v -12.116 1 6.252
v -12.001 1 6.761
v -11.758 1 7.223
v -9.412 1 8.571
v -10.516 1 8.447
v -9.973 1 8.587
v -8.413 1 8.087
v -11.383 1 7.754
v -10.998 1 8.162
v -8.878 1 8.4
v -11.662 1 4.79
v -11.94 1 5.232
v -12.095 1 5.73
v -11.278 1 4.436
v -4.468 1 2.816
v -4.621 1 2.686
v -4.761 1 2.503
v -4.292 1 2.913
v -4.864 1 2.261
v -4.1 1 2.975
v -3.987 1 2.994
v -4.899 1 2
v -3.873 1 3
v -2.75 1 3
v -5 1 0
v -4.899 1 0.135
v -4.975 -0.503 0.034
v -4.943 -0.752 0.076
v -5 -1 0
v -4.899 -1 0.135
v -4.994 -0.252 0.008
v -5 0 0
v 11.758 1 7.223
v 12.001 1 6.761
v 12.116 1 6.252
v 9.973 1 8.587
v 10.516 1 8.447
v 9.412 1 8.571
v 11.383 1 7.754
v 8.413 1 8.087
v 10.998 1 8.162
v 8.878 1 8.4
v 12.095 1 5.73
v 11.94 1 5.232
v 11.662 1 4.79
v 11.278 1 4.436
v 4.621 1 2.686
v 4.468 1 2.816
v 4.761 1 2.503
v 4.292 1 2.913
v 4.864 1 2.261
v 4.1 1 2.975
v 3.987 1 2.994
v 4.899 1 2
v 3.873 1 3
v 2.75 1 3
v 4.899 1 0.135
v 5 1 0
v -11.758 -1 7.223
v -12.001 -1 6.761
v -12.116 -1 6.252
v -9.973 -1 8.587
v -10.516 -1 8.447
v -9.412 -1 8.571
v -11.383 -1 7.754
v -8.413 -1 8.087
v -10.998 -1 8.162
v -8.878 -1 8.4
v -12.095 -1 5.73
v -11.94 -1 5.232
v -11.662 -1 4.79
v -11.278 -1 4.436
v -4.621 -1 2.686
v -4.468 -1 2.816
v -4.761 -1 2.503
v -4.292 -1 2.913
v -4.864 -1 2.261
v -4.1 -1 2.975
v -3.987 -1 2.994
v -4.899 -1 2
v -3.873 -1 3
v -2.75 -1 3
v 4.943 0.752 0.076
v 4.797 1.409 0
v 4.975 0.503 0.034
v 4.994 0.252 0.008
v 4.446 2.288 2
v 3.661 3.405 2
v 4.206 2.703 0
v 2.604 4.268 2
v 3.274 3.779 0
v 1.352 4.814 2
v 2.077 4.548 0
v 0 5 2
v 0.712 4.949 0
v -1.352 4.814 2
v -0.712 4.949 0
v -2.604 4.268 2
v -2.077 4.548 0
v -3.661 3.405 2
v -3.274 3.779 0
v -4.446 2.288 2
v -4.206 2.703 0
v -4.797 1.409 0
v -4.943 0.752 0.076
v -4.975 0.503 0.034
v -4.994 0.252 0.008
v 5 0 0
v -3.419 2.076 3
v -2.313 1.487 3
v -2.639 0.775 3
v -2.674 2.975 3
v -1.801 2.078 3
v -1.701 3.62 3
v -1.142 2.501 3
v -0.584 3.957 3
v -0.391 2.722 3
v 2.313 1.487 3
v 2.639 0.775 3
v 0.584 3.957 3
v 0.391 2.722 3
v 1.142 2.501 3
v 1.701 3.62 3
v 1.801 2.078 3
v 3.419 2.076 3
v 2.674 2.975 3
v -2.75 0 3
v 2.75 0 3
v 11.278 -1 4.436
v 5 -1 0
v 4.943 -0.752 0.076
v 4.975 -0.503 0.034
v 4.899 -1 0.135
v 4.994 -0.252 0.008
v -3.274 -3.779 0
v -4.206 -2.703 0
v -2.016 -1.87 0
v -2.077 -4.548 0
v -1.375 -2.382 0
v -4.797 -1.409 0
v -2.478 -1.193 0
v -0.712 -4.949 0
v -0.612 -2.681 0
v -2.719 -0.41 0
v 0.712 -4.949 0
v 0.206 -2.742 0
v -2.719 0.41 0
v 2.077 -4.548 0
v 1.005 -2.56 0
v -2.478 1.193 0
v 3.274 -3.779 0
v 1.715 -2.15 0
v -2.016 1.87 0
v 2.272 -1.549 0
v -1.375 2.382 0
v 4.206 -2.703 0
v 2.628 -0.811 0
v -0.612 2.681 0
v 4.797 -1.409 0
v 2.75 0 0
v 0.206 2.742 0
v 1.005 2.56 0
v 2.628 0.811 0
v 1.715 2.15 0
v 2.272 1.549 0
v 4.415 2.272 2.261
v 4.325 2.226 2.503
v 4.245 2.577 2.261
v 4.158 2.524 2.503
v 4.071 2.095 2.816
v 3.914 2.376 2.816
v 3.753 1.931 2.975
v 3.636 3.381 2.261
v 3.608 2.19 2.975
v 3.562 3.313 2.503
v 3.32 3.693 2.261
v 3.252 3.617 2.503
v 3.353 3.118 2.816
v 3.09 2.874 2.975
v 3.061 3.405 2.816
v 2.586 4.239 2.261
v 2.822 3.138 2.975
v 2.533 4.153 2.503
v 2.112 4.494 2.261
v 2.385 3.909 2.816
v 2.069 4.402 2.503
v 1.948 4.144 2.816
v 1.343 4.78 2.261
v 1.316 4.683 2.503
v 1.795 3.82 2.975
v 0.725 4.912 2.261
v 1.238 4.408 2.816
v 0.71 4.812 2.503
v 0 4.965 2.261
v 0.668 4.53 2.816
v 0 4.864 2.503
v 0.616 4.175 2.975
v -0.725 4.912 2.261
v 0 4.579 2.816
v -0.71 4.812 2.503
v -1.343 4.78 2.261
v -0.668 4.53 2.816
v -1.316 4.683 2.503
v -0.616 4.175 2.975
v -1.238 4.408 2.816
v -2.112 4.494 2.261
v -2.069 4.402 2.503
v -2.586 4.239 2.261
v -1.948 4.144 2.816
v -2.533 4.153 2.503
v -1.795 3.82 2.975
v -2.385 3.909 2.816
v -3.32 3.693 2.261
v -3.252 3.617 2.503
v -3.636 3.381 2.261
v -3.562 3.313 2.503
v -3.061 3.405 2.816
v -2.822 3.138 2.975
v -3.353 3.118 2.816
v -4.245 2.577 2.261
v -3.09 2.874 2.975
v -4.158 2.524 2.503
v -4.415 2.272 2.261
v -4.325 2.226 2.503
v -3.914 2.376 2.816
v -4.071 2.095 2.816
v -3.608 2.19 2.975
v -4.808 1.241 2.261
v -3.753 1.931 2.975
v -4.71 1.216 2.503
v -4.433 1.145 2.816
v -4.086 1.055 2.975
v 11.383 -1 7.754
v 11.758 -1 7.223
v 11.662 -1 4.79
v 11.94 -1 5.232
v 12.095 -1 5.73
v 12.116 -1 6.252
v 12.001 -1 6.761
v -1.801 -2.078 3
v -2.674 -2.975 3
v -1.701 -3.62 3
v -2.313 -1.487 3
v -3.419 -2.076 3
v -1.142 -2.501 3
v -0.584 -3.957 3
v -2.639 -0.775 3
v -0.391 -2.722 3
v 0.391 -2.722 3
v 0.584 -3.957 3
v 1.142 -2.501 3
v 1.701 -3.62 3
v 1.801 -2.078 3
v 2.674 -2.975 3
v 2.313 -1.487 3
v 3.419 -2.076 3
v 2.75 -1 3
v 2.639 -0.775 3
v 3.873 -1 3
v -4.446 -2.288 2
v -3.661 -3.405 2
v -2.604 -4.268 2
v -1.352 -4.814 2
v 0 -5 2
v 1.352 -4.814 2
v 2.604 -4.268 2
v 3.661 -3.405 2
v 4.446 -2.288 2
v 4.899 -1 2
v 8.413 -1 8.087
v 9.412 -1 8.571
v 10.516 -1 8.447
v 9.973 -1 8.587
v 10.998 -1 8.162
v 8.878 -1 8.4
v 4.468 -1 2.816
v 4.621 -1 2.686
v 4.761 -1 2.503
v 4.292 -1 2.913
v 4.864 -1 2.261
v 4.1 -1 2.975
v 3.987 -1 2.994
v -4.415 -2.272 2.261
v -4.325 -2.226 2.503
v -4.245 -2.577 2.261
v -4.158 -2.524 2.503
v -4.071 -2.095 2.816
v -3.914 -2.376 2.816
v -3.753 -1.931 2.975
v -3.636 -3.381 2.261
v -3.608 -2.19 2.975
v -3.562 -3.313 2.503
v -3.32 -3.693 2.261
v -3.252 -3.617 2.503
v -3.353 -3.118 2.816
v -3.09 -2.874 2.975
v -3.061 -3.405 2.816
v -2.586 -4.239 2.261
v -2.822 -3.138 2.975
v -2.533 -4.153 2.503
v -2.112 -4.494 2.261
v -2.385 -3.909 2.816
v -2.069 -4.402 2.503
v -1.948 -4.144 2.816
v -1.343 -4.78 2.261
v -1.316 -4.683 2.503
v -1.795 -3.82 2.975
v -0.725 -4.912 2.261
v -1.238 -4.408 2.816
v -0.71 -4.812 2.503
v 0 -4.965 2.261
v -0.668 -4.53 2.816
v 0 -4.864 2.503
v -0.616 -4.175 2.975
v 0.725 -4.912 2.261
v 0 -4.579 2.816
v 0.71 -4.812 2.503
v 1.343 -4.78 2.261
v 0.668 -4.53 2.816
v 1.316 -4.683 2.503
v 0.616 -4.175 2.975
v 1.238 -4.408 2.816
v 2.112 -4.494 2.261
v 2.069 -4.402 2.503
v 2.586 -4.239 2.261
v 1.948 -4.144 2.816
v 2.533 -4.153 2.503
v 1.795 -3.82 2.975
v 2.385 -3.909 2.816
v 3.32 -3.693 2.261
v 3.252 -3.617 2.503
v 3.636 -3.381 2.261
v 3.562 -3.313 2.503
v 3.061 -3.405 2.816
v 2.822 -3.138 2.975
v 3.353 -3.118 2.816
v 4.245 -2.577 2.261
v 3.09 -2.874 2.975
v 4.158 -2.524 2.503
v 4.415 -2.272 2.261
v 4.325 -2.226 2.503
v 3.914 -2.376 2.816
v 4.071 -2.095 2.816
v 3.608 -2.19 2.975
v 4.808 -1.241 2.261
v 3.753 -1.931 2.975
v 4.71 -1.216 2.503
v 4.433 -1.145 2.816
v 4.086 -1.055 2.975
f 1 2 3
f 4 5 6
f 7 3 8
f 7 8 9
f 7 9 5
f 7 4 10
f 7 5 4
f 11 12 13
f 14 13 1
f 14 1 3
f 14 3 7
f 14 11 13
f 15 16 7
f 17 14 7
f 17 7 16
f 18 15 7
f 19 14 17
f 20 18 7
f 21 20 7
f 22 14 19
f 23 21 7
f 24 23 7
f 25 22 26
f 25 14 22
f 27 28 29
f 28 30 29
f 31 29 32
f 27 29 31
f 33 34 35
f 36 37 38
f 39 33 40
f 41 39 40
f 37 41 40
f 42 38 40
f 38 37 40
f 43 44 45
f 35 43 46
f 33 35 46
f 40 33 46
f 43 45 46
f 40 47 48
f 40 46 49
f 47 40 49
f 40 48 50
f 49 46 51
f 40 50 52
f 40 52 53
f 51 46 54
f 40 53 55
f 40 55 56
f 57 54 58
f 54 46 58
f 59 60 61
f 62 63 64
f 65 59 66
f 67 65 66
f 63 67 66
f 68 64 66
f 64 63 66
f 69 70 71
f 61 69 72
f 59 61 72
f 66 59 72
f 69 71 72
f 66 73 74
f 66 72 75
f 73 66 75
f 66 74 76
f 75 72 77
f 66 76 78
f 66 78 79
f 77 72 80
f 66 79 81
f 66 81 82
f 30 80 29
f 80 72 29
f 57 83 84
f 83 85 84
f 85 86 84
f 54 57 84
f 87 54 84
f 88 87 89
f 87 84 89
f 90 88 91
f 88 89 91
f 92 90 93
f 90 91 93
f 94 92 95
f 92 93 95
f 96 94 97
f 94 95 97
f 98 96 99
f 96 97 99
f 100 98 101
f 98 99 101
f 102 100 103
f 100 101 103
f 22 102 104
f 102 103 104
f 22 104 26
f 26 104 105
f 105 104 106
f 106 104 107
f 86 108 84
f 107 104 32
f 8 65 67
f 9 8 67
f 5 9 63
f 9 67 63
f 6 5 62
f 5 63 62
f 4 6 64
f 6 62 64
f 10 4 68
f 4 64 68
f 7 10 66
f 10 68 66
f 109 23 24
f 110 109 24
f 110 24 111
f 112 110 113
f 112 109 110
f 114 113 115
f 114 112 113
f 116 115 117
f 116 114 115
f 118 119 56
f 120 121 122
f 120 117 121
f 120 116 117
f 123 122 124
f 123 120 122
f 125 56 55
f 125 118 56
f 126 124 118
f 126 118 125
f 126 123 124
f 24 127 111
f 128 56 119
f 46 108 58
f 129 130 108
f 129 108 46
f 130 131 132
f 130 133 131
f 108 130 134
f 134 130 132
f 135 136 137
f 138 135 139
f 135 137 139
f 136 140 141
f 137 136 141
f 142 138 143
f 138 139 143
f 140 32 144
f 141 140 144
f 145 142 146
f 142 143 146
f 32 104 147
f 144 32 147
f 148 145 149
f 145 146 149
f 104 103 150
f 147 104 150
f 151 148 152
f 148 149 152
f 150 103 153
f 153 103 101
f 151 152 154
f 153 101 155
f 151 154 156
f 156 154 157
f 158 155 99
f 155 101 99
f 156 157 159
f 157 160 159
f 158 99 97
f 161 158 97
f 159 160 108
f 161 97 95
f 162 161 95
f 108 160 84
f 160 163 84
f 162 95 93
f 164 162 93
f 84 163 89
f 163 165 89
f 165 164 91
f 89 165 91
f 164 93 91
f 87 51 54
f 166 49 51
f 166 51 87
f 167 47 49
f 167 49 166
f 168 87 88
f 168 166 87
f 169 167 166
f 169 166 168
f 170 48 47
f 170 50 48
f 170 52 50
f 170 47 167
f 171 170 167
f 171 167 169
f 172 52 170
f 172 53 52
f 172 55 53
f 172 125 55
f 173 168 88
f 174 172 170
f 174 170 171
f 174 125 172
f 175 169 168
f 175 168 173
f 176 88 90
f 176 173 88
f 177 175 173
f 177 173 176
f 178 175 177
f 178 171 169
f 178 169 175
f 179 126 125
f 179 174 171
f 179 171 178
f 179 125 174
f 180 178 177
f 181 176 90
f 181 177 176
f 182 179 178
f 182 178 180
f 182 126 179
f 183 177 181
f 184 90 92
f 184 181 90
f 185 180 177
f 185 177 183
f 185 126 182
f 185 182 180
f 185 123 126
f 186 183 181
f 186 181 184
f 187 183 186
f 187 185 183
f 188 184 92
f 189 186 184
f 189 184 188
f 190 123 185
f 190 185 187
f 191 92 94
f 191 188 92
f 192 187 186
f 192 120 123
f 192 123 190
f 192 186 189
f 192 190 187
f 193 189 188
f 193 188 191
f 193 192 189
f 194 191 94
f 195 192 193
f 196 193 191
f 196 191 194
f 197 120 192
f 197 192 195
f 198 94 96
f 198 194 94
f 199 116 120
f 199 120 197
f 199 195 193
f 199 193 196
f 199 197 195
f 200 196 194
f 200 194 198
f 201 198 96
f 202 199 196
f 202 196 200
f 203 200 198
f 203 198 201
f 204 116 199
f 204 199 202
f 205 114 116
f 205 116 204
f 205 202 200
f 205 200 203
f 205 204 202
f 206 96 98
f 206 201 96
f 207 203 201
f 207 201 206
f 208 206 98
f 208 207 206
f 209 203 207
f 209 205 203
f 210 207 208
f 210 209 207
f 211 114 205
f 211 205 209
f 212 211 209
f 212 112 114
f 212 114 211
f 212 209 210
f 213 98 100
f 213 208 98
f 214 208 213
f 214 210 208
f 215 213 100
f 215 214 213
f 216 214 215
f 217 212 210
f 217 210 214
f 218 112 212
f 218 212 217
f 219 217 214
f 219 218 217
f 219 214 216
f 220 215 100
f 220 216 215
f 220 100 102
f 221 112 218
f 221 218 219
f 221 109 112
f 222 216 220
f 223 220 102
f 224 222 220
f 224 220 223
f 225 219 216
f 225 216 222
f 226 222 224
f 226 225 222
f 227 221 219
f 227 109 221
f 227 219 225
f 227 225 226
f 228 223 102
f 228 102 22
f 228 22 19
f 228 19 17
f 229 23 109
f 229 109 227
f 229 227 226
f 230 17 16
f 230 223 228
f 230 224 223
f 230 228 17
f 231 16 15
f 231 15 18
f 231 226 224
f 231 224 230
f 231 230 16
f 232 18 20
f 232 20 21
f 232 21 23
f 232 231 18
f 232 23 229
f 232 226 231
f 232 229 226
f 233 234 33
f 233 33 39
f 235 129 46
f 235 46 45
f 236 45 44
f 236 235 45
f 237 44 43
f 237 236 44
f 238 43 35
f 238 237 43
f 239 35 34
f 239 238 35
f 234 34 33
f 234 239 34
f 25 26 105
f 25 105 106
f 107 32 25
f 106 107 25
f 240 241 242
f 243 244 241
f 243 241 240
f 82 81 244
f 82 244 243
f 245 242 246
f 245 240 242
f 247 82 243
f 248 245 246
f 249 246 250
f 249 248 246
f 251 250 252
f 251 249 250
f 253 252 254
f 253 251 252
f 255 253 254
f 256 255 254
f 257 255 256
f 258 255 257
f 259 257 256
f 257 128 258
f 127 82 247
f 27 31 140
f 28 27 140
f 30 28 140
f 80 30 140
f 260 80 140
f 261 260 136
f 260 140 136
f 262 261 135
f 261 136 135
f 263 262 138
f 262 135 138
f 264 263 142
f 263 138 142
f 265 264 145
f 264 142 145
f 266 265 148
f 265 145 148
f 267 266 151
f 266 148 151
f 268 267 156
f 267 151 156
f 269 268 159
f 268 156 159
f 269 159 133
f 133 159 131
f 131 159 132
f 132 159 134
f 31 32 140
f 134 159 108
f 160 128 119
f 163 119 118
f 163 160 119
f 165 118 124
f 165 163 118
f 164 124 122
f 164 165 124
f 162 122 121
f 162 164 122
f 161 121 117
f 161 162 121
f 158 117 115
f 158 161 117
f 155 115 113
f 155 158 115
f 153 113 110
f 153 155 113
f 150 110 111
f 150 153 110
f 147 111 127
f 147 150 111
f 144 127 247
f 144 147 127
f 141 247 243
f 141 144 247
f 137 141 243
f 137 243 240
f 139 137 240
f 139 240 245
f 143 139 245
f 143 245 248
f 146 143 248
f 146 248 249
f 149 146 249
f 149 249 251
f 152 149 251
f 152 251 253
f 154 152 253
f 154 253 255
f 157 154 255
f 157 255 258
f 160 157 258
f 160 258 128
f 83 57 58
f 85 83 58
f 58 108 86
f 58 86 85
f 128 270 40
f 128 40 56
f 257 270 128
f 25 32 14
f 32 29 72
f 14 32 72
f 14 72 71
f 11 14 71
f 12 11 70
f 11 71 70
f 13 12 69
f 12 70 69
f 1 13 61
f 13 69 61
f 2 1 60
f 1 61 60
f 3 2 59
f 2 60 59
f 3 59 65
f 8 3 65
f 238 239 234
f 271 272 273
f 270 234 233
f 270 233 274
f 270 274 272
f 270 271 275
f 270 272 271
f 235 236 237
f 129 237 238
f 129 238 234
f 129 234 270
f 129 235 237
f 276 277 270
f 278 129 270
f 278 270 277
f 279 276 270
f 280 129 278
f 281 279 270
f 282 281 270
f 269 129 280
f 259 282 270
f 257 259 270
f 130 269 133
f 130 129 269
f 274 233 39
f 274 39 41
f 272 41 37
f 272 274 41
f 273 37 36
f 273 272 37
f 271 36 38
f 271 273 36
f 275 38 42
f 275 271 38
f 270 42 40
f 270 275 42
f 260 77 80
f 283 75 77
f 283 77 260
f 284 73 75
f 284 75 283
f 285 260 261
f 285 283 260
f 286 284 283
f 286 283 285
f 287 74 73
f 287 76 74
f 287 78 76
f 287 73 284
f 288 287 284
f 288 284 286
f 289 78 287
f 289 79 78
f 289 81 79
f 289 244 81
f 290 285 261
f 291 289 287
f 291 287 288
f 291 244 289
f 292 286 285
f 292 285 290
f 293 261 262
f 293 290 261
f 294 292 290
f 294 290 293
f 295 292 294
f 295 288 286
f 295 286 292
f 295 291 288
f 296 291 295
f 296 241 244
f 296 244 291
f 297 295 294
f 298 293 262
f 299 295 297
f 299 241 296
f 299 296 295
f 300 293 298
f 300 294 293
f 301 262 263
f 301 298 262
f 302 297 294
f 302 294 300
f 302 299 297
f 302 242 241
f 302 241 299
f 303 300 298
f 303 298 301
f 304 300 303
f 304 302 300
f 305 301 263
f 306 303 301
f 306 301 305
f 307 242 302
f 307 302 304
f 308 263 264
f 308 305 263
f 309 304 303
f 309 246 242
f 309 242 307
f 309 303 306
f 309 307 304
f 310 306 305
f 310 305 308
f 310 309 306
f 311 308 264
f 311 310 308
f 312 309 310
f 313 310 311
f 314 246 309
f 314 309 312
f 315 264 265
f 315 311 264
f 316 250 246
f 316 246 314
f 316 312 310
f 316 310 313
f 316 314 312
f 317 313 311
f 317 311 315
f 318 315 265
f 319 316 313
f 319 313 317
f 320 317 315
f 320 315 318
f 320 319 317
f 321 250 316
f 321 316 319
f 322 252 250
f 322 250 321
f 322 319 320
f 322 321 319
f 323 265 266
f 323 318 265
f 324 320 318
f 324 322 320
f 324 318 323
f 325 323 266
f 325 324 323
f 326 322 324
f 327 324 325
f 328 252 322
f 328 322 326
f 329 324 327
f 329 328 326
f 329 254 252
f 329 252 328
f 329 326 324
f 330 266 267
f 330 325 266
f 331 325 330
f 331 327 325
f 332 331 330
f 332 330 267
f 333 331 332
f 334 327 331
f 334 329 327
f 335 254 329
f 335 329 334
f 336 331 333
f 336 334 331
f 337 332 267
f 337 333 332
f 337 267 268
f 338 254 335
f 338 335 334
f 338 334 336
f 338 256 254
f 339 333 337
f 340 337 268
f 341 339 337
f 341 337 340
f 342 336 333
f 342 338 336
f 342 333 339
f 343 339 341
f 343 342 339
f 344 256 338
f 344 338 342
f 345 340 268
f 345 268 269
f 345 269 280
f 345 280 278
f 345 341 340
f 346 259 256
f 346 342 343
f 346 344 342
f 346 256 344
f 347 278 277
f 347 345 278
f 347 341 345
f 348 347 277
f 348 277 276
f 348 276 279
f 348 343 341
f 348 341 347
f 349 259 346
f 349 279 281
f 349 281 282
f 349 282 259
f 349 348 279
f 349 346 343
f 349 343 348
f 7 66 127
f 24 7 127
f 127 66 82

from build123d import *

# Parameters (mm, degrees)
ESQUISSE1_R             = 5
ESQUISSE1_R_2           = 2.75
BOSS_EXTRU_1_DEPTH      = 3
BOSS_EXTRU_2_DEPTH      = 1
BOSS_EXTRU_2_DEPTH_BACK = 1
CONG_1_R                = 1


with BuildPart() as part:
    # Esquisse1 → Boss.-Extru.1 (new body)
    with BuildSketch(Plane.XY):
        Circle(ESQUISSE1_R)
        Circle(ESQUISSE1_R_2, mode=Mode.SUBTRACT)
    extrude(amount=BOSS_EXTRU_1_DEPTH)

    # Esquisse2 → Boss.-Extru.2 (add, two sides: drawn at the far end of the back side and taken through both)
    with BuildSketch(Plane(origin=(0, 0, 0), x_dir=(1, 0, 0), z_dir=(0, 1, 0)).offset(-BOSS_EXTRU_2_DEPTH_BACK)):
        with BuildLine():
            Line((-5, 0), (-11.278292154, -4.43596899))
            ThreePointArc((-11.278292154, -4.43596899), (-12.095263684, -5.73045857), (-11.757607433, -7.223487038))
            Line((-11.757607433, -7.223487038), (-11.382926754, -7.753778113))
            ThreePointArc((-11.382926754, -7.753778113), (-9.972806189, -8.587172352), (-8.41291055, -8.087460876))
            Line((-8.41291055, -8.087460876), (-2.75, -3))
            Line((-2.75, -3), (-5, 0))
        make_face()
        with BuildLine():
            Line((8.41291055, -8.087460876), (2.75, -3))
            Line((2.75, -3), (5, 0))
            Line((5, 0), (11.278292154, -4.43596899))
            ThreePointArc((11.278292154, -4.43596899), (12.095263684, -5.73045857), (11.757607433, -7.223487038))
            Line((11.757607433, -7.223487038), (11.382926754, -7.753778113))
            ThreePointArc((11.382926754, -7.753778113), (9.972806189, -8.587172352), (8.41291055, -8.087460876))
        make_face()
    extrude(amount=BOSS_EXTRU_2_DEPTH + BOSS_EXTRU_2_DEPTH_BACK)

    # Congé1
    cong_1_edges = [part.edges().sort_by_distance(p)[0] for p in [
        (0, 5, 3),
        (0, -5, 3),
    ]]
    fillet(cong_1_edges, radius=CONG_1_R)


solid = part.part
